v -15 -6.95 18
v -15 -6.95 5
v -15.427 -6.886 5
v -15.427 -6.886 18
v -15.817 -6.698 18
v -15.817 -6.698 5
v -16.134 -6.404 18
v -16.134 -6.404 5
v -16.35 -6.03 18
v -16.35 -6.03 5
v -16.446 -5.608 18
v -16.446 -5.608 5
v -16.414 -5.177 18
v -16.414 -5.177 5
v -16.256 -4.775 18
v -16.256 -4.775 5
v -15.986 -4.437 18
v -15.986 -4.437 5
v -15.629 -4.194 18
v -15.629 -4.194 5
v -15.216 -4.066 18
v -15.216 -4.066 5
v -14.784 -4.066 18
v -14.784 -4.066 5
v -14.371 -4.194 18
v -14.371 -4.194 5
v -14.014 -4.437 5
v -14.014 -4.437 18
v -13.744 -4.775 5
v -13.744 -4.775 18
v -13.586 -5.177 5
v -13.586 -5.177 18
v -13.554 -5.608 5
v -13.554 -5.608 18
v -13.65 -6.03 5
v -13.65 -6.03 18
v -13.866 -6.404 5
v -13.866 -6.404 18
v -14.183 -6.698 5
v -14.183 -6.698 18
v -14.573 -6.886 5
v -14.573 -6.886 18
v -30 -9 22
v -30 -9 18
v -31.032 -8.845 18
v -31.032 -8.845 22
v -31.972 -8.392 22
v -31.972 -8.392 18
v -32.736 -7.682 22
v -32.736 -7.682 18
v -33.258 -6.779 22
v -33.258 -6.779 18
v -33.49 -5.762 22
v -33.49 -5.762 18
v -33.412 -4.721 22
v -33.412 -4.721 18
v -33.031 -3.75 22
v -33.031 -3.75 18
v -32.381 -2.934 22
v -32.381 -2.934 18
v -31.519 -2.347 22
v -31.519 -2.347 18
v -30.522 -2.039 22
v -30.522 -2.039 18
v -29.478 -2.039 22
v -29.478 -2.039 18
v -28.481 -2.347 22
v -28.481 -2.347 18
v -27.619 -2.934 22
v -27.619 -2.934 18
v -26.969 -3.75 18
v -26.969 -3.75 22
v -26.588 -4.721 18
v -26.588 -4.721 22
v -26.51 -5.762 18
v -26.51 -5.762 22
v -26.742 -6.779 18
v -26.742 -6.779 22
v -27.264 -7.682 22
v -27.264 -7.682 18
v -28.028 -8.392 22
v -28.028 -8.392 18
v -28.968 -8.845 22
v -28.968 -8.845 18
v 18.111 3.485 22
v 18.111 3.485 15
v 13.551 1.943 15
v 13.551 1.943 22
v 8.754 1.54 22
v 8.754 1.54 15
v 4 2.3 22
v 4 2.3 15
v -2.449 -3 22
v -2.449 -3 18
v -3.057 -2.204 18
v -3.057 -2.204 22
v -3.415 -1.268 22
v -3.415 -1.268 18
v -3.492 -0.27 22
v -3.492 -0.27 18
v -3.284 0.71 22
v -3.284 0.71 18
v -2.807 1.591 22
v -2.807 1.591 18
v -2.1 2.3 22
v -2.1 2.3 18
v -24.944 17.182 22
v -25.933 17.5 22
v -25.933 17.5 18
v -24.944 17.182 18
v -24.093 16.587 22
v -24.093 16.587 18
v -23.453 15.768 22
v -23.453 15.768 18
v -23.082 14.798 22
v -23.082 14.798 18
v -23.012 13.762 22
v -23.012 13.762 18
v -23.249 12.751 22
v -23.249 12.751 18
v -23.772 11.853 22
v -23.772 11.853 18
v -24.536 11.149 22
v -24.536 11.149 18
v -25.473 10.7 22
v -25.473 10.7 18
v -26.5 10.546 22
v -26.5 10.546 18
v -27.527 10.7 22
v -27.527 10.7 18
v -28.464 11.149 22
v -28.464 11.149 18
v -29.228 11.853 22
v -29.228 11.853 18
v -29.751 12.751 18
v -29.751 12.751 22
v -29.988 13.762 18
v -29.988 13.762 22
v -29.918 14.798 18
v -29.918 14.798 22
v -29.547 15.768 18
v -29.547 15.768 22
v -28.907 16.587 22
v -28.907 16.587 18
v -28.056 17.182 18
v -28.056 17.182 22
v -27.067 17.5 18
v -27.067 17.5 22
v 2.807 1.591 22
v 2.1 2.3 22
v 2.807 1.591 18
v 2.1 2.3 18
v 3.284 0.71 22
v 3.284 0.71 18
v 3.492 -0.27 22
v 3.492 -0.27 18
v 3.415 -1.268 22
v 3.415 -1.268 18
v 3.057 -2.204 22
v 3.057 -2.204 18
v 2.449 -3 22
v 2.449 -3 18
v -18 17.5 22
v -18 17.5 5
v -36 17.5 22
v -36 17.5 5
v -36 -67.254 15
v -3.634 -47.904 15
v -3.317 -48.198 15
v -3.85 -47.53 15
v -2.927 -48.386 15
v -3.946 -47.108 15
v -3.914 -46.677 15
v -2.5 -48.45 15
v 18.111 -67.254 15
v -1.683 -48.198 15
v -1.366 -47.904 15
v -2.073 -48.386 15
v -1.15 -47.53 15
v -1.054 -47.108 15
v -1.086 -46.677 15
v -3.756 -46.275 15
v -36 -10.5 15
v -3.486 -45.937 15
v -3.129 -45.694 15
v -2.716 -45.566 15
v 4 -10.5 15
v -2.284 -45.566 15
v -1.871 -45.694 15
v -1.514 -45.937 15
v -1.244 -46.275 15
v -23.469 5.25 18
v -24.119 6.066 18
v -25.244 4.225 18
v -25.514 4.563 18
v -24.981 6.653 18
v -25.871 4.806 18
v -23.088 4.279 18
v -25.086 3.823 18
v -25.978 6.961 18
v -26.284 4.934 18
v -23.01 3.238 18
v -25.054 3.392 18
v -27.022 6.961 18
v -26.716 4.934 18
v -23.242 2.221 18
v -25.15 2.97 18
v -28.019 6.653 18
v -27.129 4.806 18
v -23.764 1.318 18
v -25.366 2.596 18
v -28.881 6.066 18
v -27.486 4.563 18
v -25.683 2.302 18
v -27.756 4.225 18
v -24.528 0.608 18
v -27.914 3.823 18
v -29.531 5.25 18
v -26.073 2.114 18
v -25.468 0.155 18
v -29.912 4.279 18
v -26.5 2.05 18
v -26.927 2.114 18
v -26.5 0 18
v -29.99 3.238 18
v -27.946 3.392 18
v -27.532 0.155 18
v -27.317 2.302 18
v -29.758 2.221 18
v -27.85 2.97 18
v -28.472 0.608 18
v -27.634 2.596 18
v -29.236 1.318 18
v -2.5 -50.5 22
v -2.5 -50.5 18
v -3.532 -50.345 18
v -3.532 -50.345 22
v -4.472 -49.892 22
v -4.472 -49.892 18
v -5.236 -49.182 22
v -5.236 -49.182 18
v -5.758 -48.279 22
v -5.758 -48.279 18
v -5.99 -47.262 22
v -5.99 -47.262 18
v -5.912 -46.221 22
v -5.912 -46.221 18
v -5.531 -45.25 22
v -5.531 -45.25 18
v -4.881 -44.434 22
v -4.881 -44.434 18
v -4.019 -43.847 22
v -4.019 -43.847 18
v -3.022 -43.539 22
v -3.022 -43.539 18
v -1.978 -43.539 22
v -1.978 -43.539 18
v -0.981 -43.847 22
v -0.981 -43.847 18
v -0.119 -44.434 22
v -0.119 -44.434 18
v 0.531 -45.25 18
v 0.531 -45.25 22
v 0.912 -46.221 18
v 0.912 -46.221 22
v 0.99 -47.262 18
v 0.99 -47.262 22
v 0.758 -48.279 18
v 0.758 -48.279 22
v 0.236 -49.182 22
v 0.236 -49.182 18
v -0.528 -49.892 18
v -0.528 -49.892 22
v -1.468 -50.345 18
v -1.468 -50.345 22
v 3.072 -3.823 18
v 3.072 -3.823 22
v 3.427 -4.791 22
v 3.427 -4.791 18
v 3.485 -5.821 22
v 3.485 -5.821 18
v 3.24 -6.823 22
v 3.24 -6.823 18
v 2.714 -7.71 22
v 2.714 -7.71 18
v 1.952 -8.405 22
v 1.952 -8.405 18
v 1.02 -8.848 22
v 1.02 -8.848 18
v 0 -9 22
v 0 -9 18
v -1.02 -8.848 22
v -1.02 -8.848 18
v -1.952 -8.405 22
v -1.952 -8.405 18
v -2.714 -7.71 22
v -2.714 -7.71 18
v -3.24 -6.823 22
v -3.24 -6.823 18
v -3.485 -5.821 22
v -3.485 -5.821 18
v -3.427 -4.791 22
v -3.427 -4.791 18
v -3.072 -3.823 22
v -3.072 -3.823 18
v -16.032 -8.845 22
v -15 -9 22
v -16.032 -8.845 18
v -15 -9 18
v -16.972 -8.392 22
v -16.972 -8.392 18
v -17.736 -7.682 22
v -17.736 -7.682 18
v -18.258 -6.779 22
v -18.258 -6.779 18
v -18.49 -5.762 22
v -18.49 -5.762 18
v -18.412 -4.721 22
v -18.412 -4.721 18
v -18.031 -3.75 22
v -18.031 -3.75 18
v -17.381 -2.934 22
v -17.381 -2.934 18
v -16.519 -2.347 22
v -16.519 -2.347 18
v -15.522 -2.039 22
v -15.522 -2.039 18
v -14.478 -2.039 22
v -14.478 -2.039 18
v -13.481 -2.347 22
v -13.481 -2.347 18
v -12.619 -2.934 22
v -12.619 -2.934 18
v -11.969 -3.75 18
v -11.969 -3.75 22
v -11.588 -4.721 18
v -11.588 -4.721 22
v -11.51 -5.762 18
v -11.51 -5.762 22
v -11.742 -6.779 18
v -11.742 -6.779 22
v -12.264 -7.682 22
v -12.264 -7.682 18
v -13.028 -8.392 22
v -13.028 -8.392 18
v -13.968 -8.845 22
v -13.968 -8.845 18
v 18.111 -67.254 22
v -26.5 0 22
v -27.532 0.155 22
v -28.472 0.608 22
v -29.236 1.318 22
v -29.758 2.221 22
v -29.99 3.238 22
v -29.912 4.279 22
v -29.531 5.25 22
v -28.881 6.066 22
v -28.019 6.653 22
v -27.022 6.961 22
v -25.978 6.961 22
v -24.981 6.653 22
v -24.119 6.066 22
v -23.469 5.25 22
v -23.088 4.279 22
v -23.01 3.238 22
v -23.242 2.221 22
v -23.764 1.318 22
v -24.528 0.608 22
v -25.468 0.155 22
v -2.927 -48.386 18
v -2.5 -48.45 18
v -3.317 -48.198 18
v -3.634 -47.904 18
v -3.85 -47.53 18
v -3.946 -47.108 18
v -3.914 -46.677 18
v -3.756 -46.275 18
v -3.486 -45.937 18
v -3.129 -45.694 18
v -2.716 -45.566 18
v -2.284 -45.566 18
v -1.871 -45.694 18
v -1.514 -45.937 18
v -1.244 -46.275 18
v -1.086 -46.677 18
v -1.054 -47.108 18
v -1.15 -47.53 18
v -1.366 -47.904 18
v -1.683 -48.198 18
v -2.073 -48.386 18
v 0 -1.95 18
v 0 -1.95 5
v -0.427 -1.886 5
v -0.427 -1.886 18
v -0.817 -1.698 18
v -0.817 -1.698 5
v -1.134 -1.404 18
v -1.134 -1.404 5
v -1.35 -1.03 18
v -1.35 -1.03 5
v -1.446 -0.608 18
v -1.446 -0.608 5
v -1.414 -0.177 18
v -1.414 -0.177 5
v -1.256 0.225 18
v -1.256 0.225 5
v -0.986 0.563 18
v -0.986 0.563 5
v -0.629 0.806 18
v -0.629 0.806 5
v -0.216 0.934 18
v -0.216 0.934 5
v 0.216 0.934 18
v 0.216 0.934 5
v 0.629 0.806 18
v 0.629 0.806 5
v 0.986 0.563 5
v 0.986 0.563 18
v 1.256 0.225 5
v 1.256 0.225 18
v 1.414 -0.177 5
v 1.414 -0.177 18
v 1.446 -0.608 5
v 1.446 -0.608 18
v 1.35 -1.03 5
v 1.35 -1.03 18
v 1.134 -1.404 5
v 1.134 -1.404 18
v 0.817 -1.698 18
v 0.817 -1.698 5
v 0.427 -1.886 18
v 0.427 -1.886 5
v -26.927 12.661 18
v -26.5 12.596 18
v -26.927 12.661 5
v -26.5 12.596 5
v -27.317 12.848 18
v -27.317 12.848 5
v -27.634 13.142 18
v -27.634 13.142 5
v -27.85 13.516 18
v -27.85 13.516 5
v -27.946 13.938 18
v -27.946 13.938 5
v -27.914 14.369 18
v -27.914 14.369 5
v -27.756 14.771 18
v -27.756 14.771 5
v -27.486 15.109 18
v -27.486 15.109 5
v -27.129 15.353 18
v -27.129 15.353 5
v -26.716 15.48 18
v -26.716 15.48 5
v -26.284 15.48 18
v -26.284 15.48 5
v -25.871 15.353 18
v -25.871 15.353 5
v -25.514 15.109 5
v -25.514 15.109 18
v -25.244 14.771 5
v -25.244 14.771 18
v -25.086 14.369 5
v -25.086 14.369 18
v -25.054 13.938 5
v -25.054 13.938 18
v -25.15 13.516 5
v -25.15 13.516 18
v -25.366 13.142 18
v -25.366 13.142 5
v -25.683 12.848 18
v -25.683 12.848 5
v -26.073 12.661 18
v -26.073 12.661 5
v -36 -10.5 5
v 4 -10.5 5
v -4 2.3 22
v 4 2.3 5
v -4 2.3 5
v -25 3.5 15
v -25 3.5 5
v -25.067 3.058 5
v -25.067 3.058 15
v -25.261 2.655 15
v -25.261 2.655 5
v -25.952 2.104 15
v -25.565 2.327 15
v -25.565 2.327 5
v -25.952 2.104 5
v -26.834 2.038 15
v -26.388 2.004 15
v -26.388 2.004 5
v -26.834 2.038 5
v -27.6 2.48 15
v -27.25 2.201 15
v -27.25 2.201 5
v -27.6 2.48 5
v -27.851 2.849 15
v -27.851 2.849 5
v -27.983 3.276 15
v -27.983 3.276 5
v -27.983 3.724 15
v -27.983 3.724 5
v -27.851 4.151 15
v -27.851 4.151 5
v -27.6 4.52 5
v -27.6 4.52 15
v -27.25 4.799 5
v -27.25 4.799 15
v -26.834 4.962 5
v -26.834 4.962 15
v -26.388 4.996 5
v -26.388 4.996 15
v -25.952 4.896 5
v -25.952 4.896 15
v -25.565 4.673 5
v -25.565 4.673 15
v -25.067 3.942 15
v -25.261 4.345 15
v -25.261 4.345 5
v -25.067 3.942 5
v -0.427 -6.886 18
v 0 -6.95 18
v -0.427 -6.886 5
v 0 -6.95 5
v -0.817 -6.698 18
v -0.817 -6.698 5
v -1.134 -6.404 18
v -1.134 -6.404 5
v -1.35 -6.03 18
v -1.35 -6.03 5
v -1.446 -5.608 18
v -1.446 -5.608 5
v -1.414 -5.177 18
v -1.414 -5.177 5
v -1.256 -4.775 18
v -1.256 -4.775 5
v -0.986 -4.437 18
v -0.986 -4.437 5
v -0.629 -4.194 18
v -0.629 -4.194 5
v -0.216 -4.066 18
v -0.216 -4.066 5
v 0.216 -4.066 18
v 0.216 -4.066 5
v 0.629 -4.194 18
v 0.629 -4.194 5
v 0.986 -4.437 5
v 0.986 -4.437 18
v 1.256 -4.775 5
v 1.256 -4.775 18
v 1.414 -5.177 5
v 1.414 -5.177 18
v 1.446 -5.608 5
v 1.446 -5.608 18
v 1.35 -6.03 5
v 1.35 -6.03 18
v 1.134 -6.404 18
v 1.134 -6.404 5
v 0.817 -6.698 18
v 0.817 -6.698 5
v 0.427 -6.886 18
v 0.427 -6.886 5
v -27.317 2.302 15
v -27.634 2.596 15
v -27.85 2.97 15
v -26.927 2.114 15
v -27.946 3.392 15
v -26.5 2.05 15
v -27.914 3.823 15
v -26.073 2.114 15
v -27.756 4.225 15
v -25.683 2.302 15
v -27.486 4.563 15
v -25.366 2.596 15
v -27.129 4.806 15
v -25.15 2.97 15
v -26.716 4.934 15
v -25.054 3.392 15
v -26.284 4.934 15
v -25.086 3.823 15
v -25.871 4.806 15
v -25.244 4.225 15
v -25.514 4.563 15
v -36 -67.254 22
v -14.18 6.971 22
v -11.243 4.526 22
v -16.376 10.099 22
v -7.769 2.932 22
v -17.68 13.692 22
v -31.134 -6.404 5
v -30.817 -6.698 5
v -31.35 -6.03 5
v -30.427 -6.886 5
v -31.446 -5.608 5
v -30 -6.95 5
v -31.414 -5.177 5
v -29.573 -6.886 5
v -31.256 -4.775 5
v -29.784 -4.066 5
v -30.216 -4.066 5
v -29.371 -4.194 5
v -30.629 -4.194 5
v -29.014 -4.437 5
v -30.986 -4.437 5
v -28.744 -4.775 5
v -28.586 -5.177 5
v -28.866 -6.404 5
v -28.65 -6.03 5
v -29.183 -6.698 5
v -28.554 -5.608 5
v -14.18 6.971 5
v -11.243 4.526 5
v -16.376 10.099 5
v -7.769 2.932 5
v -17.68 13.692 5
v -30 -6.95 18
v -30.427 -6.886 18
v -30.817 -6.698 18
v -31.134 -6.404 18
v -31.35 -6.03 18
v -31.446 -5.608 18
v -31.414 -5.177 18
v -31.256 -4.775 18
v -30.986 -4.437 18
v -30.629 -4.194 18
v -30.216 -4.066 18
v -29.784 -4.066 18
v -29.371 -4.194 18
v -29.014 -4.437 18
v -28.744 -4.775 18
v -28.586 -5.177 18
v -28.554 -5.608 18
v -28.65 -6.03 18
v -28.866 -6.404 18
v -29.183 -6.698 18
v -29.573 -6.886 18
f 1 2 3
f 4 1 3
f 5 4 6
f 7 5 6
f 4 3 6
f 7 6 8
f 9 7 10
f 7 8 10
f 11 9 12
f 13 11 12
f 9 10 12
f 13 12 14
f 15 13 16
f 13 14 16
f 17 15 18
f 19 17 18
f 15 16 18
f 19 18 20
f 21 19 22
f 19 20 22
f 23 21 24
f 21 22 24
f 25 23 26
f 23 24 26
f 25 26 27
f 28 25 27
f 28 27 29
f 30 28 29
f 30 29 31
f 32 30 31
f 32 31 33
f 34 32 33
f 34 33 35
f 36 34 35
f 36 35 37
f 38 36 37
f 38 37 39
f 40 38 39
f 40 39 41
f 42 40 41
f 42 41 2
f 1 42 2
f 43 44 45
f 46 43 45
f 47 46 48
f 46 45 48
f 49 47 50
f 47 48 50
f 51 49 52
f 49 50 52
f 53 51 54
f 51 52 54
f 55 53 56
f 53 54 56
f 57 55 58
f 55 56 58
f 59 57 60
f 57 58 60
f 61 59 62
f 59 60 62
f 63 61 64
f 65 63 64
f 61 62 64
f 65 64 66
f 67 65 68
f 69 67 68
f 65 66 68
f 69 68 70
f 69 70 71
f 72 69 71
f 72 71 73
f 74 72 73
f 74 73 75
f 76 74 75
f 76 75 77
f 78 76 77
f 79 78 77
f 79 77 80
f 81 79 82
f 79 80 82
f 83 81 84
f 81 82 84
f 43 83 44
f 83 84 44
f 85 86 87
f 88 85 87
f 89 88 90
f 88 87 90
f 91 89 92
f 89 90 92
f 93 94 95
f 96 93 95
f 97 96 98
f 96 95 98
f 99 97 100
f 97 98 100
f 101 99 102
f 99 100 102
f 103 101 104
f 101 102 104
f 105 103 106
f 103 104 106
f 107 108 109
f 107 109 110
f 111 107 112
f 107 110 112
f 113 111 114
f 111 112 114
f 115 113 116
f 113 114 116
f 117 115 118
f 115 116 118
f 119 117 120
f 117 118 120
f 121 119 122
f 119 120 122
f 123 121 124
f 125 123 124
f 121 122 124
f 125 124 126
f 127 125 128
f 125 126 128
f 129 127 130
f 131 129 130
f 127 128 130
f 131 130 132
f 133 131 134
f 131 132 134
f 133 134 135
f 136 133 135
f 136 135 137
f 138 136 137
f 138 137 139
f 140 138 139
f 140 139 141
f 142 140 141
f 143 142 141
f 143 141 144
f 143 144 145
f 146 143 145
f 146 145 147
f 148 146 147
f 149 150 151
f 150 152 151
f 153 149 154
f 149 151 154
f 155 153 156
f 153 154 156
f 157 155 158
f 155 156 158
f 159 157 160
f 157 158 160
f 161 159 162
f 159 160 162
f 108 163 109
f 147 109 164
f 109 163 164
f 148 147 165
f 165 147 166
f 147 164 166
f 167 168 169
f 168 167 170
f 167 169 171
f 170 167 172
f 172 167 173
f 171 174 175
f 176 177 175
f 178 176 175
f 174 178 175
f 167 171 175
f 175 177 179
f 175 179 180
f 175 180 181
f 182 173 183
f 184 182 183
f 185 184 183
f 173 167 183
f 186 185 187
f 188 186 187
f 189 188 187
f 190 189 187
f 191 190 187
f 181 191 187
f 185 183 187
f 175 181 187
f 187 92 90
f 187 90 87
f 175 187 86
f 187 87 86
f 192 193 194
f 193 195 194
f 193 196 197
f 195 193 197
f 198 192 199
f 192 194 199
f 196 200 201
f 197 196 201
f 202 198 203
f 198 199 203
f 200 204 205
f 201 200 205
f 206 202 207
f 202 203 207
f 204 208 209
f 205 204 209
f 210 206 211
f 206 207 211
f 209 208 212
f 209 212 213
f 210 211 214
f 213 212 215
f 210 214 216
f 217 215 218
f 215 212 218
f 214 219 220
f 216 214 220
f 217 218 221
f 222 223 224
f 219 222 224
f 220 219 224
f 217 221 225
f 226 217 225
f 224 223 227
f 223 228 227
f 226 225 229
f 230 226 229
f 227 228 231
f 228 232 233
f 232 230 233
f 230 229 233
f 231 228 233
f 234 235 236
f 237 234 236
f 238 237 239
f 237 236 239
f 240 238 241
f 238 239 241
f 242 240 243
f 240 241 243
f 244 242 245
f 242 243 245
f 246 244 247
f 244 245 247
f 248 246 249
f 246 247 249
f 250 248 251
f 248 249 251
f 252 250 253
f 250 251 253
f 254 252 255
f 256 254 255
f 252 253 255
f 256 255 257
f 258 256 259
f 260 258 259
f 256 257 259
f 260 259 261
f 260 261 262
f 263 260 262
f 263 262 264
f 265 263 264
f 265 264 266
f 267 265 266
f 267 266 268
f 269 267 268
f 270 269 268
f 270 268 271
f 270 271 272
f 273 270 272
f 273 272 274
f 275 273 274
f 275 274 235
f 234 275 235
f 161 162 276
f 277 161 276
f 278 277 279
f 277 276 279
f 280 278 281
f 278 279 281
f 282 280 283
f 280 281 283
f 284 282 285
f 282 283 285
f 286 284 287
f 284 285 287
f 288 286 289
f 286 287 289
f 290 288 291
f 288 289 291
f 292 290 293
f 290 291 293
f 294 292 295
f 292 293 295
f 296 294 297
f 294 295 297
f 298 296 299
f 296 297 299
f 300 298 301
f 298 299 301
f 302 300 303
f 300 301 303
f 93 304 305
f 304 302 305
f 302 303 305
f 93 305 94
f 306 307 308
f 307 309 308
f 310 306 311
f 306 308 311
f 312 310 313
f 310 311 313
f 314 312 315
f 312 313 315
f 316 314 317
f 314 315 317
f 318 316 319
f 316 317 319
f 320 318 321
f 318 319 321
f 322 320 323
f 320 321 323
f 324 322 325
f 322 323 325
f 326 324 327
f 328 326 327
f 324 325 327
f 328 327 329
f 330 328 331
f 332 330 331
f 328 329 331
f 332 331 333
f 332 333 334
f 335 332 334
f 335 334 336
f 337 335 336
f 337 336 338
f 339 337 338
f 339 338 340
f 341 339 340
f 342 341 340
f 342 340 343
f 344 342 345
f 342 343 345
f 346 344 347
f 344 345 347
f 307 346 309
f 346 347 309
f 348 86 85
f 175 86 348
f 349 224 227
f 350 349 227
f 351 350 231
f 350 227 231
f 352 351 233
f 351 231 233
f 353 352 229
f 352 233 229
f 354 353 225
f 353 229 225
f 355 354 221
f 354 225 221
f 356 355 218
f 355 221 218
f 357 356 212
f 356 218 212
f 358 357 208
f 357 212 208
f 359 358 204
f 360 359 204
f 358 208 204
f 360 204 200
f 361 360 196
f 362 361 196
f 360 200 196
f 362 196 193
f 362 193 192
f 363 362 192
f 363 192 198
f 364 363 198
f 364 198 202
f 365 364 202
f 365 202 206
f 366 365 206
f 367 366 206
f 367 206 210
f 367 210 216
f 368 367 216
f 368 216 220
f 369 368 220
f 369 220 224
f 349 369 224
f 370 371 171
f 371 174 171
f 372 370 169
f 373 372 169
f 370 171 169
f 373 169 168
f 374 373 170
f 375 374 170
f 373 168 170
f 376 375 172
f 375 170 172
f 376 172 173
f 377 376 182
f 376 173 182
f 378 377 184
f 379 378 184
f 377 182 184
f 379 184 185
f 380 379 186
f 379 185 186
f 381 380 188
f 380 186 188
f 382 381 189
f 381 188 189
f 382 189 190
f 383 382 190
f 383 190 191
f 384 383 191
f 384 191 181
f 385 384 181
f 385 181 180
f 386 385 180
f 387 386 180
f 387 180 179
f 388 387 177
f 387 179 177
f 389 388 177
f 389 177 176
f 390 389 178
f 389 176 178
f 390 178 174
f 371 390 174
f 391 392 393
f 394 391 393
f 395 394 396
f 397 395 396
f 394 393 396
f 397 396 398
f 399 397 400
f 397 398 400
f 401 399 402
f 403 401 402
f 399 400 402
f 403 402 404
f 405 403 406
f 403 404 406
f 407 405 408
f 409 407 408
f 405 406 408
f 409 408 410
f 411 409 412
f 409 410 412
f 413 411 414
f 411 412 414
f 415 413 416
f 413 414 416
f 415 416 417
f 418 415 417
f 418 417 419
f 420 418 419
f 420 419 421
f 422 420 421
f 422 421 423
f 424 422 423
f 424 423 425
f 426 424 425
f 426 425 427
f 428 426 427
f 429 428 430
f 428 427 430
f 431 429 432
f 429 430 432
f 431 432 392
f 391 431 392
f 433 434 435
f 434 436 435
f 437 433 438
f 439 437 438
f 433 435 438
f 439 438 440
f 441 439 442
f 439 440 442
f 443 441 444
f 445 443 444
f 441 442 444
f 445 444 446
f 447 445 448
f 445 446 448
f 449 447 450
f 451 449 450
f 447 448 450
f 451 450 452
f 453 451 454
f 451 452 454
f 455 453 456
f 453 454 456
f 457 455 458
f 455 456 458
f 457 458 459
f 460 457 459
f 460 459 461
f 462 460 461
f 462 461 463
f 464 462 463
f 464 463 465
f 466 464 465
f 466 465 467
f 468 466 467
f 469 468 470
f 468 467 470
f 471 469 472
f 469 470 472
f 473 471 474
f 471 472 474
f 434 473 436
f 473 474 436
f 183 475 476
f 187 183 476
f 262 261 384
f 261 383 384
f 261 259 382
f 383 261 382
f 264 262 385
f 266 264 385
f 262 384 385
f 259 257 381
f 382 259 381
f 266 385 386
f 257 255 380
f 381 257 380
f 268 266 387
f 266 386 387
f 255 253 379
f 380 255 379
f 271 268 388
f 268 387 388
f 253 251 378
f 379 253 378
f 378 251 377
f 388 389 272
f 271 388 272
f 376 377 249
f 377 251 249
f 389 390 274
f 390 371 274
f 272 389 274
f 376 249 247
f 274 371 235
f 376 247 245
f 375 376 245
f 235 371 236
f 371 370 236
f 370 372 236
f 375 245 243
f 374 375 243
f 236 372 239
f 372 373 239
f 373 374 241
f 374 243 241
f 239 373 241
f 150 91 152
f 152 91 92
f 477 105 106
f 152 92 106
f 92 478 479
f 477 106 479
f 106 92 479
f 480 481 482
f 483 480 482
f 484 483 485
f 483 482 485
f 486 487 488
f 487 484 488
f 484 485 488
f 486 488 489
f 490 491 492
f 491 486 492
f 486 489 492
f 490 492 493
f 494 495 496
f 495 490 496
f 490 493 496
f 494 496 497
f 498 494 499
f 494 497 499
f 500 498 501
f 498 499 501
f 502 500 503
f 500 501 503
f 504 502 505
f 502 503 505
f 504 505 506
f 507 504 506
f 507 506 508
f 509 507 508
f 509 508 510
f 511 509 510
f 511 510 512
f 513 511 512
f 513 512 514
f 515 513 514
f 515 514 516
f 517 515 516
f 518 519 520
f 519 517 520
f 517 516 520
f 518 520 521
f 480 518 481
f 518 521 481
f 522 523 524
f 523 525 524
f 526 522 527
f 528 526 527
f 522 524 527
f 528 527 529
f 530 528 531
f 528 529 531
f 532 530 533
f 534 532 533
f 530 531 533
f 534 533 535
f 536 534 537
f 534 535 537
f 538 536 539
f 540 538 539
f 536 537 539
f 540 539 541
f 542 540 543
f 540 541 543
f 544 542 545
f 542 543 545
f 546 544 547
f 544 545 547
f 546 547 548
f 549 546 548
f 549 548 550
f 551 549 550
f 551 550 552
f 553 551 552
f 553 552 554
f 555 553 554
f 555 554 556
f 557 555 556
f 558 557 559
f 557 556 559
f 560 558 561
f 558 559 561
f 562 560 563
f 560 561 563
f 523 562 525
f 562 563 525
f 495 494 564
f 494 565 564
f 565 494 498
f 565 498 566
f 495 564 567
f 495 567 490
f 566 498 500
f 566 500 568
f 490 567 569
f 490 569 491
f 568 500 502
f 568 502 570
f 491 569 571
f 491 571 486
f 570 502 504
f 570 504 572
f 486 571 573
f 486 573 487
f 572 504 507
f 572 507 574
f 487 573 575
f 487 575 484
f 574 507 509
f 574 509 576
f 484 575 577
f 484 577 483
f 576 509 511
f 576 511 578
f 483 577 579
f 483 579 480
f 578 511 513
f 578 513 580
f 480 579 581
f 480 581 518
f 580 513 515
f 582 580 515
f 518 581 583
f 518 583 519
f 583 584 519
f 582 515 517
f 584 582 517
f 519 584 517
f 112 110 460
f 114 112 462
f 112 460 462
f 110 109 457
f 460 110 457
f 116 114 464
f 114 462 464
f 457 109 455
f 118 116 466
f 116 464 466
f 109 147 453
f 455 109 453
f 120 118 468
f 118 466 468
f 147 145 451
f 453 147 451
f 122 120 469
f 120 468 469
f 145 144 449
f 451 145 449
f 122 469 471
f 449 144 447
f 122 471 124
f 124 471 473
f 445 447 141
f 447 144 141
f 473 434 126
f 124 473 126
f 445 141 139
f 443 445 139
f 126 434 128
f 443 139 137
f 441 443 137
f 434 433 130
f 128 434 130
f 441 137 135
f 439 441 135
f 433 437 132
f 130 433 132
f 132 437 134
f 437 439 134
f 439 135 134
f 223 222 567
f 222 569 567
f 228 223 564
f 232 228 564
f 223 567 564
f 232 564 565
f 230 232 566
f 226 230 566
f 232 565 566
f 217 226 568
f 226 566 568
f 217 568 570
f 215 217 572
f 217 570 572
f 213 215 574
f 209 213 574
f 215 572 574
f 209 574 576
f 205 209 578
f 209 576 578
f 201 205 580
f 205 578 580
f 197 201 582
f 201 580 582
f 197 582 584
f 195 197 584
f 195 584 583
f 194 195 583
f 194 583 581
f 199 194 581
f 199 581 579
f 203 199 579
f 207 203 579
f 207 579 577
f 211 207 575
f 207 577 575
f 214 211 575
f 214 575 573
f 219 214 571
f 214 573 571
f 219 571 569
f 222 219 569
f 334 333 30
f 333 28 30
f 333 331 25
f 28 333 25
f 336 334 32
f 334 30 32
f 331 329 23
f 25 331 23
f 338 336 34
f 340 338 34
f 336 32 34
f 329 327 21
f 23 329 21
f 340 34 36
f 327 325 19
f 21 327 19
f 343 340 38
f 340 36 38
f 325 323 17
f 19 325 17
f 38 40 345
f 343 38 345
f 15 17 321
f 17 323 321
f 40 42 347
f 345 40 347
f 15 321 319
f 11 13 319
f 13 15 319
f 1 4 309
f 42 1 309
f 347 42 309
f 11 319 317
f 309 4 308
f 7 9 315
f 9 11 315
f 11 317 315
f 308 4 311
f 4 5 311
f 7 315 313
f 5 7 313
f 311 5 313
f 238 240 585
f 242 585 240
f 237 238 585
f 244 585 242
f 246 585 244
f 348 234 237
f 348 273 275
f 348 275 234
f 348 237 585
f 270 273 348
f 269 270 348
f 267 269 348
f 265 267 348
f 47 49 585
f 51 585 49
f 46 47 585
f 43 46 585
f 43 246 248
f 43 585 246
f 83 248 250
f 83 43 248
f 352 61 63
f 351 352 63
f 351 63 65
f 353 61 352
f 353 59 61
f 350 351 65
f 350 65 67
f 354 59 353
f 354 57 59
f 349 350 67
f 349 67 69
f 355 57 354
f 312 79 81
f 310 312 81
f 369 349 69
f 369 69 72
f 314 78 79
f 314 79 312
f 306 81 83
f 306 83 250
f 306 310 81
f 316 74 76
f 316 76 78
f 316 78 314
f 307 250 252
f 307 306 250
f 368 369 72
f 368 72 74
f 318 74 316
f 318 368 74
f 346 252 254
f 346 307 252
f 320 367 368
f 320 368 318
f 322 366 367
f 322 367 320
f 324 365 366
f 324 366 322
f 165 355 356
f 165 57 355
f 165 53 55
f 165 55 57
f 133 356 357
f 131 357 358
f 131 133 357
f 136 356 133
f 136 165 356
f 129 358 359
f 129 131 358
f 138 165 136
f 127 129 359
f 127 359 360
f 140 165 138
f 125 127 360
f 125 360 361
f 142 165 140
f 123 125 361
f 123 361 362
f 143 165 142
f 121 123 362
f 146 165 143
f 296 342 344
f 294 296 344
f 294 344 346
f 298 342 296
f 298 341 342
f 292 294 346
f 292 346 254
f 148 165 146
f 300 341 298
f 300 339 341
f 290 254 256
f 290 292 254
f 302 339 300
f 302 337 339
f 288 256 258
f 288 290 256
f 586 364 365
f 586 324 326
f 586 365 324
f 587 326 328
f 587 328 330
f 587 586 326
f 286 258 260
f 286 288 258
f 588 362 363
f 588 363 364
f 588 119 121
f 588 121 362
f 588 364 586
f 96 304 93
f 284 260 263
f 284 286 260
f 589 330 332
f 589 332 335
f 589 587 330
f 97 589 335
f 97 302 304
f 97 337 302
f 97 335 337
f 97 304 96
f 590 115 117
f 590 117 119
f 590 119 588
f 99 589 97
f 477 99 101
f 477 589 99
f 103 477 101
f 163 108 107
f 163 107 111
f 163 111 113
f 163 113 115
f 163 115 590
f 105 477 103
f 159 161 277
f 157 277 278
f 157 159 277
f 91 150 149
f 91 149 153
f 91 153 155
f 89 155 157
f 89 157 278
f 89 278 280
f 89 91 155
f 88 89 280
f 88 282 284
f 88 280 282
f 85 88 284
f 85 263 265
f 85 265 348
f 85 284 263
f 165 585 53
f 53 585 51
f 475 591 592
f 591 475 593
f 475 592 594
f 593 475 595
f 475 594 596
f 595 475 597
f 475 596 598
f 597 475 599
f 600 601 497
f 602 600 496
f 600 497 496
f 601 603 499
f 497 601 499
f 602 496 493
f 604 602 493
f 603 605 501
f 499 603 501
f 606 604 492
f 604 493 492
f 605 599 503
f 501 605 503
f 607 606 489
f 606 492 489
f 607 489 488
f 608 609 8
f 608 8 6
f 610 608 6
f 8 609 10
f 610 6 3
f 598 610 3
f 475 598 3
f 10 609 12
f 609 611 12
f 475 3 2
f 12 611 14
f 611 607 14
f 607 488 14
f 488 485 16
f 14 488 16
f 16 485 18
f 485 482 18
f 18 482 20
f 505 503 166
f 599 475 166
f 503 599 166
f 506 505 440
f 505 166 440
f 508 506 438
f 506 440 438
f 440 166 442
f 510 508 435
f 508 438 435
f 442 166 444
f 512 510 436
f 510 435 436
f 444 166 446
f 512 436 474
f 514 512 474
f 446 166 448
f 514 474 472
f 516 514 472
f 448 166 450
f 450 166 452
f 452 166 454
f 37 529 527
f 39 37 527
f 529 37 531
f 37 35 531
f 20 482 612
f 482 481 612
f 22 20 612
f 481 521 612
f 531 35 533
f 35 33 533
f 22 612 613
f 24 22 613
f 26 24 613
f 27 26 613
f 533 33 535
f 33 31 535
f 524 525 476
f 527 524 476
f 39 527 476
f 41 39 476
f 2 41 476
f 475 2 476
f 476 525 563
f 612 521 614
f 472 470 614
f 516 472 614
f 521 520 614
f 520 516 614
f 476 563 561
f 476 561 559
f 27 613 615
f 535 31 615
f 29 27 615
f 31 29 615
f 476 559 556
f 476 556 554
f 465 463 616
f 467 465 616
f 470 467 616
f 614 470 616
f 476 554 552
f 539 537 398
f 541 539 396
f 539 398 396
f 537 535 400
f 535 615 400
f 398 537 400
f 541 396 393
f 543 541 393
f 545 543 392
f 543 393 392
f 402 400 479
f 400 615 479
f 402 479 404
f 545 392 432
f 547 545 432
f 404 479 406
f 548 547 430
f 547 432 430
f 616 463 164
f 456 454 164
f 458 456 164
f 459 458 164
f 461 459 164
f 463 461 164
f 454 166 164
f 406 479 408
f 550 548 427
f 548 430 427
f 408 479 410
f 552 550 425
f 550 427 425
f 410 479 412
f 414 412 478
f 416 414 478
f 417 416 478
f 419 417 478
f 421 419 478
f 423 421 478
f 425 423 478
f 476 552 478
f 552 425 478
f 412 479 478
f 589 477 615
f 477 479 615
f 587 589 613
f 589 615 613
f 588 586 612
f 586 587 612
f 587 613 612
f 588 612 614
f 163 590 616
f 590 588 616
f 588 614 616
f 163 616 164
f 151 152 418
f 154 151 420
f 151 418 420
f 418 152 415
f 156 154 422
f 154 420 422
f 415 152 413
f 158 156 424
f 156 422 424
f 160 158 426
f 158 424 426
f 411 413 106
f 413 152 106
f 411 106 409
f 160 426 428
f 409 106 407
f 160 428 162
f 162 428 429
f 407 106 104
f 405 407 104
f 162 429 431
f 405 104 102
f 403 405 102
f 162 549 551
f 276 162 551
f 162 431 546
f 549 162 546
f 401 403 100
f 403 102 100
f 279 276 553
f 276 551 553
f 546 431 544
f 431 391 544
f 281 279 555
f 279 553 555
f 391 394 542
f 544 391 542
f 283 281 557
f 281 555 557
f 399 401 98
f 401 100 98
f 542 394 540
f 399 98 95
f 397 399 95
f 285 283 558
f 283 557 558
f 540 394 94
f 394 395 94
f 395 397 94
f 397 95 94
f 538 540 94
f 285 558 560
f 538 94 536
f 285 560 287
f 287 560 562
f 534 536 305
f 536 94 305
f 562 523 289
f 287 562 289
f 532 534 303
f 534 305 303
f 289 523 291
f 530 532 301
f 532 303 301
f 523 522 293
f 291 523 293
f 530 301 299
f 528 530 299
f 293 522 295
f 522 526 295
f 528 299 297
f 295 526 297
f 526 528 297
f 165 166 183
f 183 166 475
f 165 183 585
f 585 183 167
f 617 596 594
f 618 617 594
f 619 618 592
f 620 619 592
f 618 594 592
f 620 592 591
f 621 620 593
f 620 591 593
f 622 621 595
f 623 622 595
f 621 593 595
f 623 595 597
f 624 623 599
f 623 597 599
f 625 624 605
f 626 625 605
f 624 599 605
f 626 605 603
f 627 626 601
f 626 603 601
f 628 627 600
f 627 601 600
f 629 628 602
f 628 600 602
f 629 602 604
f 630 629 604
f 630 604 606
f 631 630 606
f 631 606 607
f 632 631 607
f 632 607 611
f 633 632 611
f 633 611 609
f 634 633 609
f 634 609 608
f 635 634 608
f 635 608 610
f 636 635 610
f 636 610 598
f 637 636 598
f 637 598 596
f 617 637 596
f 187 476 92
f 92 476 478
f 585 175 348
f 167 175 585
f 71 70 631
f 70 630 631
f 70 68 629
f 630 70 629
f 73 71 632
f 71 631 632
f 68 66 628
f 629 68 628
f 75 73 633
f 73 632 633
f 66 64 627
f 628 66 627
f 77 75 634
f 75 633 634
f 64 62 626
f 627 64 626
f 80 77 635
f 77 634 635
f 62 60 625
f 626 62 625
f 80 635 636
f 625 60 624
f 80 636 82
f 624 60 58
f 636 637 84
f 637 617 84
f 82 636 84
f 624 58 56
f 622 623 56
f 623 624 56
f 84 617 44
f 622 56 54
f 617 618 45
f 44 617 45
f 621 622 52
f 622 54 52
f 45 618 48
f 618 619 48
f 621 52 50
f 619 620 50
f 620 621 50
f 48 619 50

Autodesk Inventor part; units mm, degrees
ref_plane "YZ Plane" through (0, 0, 0) normal (1, 0, 0) x (0, 1, 0)
ref_plane "XZ Plane" through (0, 0, 0) normal (0, 1, 0) x (-1, 0, 0)
ref_plane "XY Plane" through (0, 0, 0) normal (0, 0, 1) x (1, 0, 0)
ref_plane "Work Plane2" through (4.5, -13.125, 5) normal (0, 0, 1) x (1, 0, 0)
sketch "Sketch5" plane through (4.5, -13.125, 5) normal (0, 0, 1) x (1, 0, 0)
  circle A0 centre (-5.3843, -10.9183) radius 3.5 projected
  line L0 (40.5, 19.8795) -> (20.6391, 19.8795) projected
  line L1 (20.6391, 19.8795) -> (-0.5, 15.425) projected
  line L2 (-0.5, 15.425) -> (-8.5, 15.425) projected
  line L3 (-8.5, 15.425) -> (-8.5, 12.625) projected
  line L4 (-8.5, 12.625) -> (-22.6946, 12.625) projected
  line L5 (-22.6946, 12.625) -> (-28.1392, 19.0495) projected
  arc A1 (-28.1392, 19.0495) -> (-34.556, 17.8156) centre (-31, 16.625) ccw projected
  spline S0 degree 3 poles (-34.556, 17.8156) (-34.7591, 16.8991) (-35.0888, 16.002) (-36.0242, 14.6392) (-36.5194, 14.1543) (-37.6005, 13.4479) (-38.1283, 13.21) (-39.2688, 12.8371) (-39.8866, 12.7101) (-40.5, 12.625) knots 0 0 0 0 0.281642 0.281642 0.494296 0.494296 0.667567 0.667567 0.853113 0.853113 0.853113 0.853113 projected
  line L6 (-40.5, 12.625) -> (-40.5, 2.625) projected
  line L7 (-40.5, 2.625) -> (-0.5, 2.625) projected
  line L8 (-0.5, 2.625) -> (20.6391, 7.0795) projected
  line L9 (20.6391, 7.0795) -> (20.6391, -0.375) projected
  line L10 (20.6391, -0.375) -> (-19.5, -0.375) projected
  line L11 (-19.5, -0.375) -> (-19.5, -6.375) projected
  line L12 (-19.5, -6.375) -> (-16.1781, -6.375) projected
  line L13 (-16.1781, -6.375) -> (-16.1781, -20.375) projected
  line L14 (-16.1781, -20.375) -> (5.3645, -20.375) projected
  line L15 (5.3645, -20.375) -> (5.3645, -6.375) projected
  line L16 (5.3645, -6.375) -> (40.5, -6.375) projected
  line L17 (40.5, -6.375) -> (40.5, 19.8795) projected
  line L18 (20.6391, 19.3686) -> (20.6391, 7.5905) projected
  line L19 (20.6391, 7.5905) -> (17.9999, 7.0344) projected
  line L20 (17.9999, 7.0344) -> (17.2782, 10.4592) projected
  line L21 (17.2782, 10.4592) -> (2.6006, 7.3662) projected
  line L22 (2.6006, 7.3662) -> (3.3222, 3.9414) projected
  line L23 (3.3222, 3.9414) -> (-0.5, 3.136) projected
  line L24 (-0.5, 3.136) -> (-0.5, 14.914) projected
  line L25 (-0.5, 14.914) -> (2.9614, 15.6434) projected
  line L26 (2.9614, 15.6434) -> (3.6831, 12.2186) projected
  line L27 (3.6831, 12.2186) -> (18.3608, 15.3116) projected
  line L28 (18.3608, 15.3116) -> (17.6391, 18.7364) projected
  line L29 (17.6391, 18.7364) -> (20.6391, 19.3686) projected
  circle A2 centre (-4.5, 7.625) radius 1.4 projected
  circle A3 centre (-4.5, 12.625) radius 1.4 projected
  circle A4 centre (-19.5, 7.625) radius 1.4 projected
  circle A5 centre (-34.5, 7.625) radius 1.4 projected
  circle A6 centre (-31, 16.625) radius 1.5 projected
  line L30 (-0.5, 2.625) -> (-0.5, 15.425)
  line L31 (-22.6946, 12.625) -> (-40.5, 12.625)
  arc A7 (-22.5, 30.625) -> (-8.5, 15.425) centre (-8.0073, 29.9262) ccw projected
  line L32 (-22.5, 30.625) -> (-40.5, 30.625) projected
  line L33 (-40.5, 30.625) -> (-40.5, 2.625) projected
  circle A8 centre (-31, 27.1712) radius 1.4 projected
  point P0 (-4.5, 13.125)
extrude "Extrusion3" add sketch "Sketch5" along normal blind 10 contours L30 L24 L7 L6 L31 L4 L3 L2 | L3 L4 L5 A1 S0 L33 L32 A7 | L31 S0 A1 L5
sketch "Sketch6" plane through (4.5, -13.125, 15) normal (0, 0, 1) x (1, 0, 0)
  circle A0 centre (-34.5, 7.625) radius 1.4 projected
  circle A1 centre (-19.5, 7.625) radius 1.4 projected
  circle A2 centre (-4.5, 12.625) radius 1.4 projected
  circle A3 centre (-4.5, 7.625) radius 1.4 projected
  line L0 (-0.5, 15.425) -> (-8.5, 15.425) projected
  line L1 (-40.5, 30.625) -> (-40.5, 2.625) projected
  line L2 (-40.5, 2.625) -> (-0.5, 2.625) projected
  line L3 (-0.5, 2.625) -> (-0.5, 15.425) projected
  circle A4 centre (4.9975, 34.5751) radius 13.9 construction
  line L4 (-0.5, 2.625) -> (-0.5, 15.425) projected
  arc A5 (-0.5, 15.425) -> (13.6114, 16.6099) centre (4.9975, 34.5751) ccw
  line L5 (-8.5, 12.625) -> (-40.5, 12.625) projected
  line L6 (-40.5, 12.625) -> (-40.5, 34.5751)
  line L7 (-40.5, 34.5751) -> (-14.9261, 34.5751)
  line L8 (13.6114, 16.6099) -> (13.6114, -54.1295)
  line L9 (13.6114, 16.6099) -> (84.3508, 16.6099) construction
  line L10 (13.6114, -54.1295) -> (-40.5, -54.1295)
  line L11 (-40.5, -54.1295) -> (-40.5, 2.625)
  arc A6 (-22.5, 30.625) -> (-8.5, 15.425) centre (-8.0073, 29.9262) ccw projected
  line L12 (-22.5, 30.625) -> (-40.5, 30.625) projected
  circle A7 centre (-8.0073, 29.9262) radius 14.5095
  line L13 (-40.5, 30.625) -> (-40.5, 2.625) projected
  line L14 (-40.5, 30.625) -> (-40.5, 40.6638)
  line L15 (-8.0073, 44.4357) -> (-8.0073, 46.4357)
  line L16 (-8.0073, 46.4357) -> (-40.5, 46.4357)
  line L17 (-40.5, 46.4357) -> (-40.5, 30.625)
  line L18 (-22.5, 30.625) -> (-40.5, 30.625) projected
  line L19 (-22.5, 30.625) -> (-40.5, 30.625)
  point P0 (-4.5, 13.125)
  dimension "d15" = 90
  dimension "d25" = 2
  dimension "d26" = 90
extrude "Extrusion4" add sketch "Sketch6" along normal blind 7 contours L3 L2 L1 L12 A6 A7 L0 | A5 L8 L10 L11 L2 L3 | A7 L0
sketch "Sketch7" plane through (4.5, -13.125, 22) normal (0, 0, 1) x (1, 0, 0)
  circle A0 centre (-19.5, 7.625) radius 1.4 projected
  circle A1 centre (-34.5, 7.625) radius 1.4 projected
  circle A2 centre (-4.5, 7.625) radius 1.4 projected
  circle A3 centre (-4.5, 12.625) radius 1.4 projected
  circle A4 centre (-31, 16.625) radius 1.5 projected
  circle A5 centre (-4.5, 7.625) radius 1.4 projected
  circle A6 centre (-4.5, 12.625) radius 1.4 projected
  circle A7 centre (-19.5, 7.625) radius 1.4 projected
  circle A8 centre (-34.5, 7.625) radius 1.4 projected
  line L0 (-0.5, 15.425) -> (-8.5, 15.425) projected
  arc A9 (-22.5, 30.625) -> (-8.5, 15.425) centre (-8.0073, 29.9262) ccw projected
  line L1 (-22.5, 30.625) -> (-40.5, 30.625) projected
  line L2 (-40.5, 30.625) -> (-40.5, -54.1295) projected
  line L3 (-40.5, -54.1295) -> (13.6114, -54.1295) projected
  line L4 (13.6114, -54.1295) -> (13.6114, 16.6099) projected
  arc A10 (-0.5, 15.425) -> (13.6114, 16.6099) centre (4.9975, 34.5751) ccw projected
  circle A11 centre (-31, 27.1712) radius 1.4 projected
  circle A12 centre (-7, -33.875) radius 1.95 projected
  point P0 (-4.5, 13.125)
hole "Hole2" at (-30, -5.5, 22) at (-15, -5.5, 22) at (0, -5.5, 22) at (0, -0.5, 22) at (-26.5, 3.5, 22) at (-2.5, -47, 22) at (-26.5, 14.0462, 22) direction (0, 0, -1) diameter 2.9 end through all counterbore diameter 7 counterbore depth 4
properties part number "cellSTORM_cellphone_plate"
